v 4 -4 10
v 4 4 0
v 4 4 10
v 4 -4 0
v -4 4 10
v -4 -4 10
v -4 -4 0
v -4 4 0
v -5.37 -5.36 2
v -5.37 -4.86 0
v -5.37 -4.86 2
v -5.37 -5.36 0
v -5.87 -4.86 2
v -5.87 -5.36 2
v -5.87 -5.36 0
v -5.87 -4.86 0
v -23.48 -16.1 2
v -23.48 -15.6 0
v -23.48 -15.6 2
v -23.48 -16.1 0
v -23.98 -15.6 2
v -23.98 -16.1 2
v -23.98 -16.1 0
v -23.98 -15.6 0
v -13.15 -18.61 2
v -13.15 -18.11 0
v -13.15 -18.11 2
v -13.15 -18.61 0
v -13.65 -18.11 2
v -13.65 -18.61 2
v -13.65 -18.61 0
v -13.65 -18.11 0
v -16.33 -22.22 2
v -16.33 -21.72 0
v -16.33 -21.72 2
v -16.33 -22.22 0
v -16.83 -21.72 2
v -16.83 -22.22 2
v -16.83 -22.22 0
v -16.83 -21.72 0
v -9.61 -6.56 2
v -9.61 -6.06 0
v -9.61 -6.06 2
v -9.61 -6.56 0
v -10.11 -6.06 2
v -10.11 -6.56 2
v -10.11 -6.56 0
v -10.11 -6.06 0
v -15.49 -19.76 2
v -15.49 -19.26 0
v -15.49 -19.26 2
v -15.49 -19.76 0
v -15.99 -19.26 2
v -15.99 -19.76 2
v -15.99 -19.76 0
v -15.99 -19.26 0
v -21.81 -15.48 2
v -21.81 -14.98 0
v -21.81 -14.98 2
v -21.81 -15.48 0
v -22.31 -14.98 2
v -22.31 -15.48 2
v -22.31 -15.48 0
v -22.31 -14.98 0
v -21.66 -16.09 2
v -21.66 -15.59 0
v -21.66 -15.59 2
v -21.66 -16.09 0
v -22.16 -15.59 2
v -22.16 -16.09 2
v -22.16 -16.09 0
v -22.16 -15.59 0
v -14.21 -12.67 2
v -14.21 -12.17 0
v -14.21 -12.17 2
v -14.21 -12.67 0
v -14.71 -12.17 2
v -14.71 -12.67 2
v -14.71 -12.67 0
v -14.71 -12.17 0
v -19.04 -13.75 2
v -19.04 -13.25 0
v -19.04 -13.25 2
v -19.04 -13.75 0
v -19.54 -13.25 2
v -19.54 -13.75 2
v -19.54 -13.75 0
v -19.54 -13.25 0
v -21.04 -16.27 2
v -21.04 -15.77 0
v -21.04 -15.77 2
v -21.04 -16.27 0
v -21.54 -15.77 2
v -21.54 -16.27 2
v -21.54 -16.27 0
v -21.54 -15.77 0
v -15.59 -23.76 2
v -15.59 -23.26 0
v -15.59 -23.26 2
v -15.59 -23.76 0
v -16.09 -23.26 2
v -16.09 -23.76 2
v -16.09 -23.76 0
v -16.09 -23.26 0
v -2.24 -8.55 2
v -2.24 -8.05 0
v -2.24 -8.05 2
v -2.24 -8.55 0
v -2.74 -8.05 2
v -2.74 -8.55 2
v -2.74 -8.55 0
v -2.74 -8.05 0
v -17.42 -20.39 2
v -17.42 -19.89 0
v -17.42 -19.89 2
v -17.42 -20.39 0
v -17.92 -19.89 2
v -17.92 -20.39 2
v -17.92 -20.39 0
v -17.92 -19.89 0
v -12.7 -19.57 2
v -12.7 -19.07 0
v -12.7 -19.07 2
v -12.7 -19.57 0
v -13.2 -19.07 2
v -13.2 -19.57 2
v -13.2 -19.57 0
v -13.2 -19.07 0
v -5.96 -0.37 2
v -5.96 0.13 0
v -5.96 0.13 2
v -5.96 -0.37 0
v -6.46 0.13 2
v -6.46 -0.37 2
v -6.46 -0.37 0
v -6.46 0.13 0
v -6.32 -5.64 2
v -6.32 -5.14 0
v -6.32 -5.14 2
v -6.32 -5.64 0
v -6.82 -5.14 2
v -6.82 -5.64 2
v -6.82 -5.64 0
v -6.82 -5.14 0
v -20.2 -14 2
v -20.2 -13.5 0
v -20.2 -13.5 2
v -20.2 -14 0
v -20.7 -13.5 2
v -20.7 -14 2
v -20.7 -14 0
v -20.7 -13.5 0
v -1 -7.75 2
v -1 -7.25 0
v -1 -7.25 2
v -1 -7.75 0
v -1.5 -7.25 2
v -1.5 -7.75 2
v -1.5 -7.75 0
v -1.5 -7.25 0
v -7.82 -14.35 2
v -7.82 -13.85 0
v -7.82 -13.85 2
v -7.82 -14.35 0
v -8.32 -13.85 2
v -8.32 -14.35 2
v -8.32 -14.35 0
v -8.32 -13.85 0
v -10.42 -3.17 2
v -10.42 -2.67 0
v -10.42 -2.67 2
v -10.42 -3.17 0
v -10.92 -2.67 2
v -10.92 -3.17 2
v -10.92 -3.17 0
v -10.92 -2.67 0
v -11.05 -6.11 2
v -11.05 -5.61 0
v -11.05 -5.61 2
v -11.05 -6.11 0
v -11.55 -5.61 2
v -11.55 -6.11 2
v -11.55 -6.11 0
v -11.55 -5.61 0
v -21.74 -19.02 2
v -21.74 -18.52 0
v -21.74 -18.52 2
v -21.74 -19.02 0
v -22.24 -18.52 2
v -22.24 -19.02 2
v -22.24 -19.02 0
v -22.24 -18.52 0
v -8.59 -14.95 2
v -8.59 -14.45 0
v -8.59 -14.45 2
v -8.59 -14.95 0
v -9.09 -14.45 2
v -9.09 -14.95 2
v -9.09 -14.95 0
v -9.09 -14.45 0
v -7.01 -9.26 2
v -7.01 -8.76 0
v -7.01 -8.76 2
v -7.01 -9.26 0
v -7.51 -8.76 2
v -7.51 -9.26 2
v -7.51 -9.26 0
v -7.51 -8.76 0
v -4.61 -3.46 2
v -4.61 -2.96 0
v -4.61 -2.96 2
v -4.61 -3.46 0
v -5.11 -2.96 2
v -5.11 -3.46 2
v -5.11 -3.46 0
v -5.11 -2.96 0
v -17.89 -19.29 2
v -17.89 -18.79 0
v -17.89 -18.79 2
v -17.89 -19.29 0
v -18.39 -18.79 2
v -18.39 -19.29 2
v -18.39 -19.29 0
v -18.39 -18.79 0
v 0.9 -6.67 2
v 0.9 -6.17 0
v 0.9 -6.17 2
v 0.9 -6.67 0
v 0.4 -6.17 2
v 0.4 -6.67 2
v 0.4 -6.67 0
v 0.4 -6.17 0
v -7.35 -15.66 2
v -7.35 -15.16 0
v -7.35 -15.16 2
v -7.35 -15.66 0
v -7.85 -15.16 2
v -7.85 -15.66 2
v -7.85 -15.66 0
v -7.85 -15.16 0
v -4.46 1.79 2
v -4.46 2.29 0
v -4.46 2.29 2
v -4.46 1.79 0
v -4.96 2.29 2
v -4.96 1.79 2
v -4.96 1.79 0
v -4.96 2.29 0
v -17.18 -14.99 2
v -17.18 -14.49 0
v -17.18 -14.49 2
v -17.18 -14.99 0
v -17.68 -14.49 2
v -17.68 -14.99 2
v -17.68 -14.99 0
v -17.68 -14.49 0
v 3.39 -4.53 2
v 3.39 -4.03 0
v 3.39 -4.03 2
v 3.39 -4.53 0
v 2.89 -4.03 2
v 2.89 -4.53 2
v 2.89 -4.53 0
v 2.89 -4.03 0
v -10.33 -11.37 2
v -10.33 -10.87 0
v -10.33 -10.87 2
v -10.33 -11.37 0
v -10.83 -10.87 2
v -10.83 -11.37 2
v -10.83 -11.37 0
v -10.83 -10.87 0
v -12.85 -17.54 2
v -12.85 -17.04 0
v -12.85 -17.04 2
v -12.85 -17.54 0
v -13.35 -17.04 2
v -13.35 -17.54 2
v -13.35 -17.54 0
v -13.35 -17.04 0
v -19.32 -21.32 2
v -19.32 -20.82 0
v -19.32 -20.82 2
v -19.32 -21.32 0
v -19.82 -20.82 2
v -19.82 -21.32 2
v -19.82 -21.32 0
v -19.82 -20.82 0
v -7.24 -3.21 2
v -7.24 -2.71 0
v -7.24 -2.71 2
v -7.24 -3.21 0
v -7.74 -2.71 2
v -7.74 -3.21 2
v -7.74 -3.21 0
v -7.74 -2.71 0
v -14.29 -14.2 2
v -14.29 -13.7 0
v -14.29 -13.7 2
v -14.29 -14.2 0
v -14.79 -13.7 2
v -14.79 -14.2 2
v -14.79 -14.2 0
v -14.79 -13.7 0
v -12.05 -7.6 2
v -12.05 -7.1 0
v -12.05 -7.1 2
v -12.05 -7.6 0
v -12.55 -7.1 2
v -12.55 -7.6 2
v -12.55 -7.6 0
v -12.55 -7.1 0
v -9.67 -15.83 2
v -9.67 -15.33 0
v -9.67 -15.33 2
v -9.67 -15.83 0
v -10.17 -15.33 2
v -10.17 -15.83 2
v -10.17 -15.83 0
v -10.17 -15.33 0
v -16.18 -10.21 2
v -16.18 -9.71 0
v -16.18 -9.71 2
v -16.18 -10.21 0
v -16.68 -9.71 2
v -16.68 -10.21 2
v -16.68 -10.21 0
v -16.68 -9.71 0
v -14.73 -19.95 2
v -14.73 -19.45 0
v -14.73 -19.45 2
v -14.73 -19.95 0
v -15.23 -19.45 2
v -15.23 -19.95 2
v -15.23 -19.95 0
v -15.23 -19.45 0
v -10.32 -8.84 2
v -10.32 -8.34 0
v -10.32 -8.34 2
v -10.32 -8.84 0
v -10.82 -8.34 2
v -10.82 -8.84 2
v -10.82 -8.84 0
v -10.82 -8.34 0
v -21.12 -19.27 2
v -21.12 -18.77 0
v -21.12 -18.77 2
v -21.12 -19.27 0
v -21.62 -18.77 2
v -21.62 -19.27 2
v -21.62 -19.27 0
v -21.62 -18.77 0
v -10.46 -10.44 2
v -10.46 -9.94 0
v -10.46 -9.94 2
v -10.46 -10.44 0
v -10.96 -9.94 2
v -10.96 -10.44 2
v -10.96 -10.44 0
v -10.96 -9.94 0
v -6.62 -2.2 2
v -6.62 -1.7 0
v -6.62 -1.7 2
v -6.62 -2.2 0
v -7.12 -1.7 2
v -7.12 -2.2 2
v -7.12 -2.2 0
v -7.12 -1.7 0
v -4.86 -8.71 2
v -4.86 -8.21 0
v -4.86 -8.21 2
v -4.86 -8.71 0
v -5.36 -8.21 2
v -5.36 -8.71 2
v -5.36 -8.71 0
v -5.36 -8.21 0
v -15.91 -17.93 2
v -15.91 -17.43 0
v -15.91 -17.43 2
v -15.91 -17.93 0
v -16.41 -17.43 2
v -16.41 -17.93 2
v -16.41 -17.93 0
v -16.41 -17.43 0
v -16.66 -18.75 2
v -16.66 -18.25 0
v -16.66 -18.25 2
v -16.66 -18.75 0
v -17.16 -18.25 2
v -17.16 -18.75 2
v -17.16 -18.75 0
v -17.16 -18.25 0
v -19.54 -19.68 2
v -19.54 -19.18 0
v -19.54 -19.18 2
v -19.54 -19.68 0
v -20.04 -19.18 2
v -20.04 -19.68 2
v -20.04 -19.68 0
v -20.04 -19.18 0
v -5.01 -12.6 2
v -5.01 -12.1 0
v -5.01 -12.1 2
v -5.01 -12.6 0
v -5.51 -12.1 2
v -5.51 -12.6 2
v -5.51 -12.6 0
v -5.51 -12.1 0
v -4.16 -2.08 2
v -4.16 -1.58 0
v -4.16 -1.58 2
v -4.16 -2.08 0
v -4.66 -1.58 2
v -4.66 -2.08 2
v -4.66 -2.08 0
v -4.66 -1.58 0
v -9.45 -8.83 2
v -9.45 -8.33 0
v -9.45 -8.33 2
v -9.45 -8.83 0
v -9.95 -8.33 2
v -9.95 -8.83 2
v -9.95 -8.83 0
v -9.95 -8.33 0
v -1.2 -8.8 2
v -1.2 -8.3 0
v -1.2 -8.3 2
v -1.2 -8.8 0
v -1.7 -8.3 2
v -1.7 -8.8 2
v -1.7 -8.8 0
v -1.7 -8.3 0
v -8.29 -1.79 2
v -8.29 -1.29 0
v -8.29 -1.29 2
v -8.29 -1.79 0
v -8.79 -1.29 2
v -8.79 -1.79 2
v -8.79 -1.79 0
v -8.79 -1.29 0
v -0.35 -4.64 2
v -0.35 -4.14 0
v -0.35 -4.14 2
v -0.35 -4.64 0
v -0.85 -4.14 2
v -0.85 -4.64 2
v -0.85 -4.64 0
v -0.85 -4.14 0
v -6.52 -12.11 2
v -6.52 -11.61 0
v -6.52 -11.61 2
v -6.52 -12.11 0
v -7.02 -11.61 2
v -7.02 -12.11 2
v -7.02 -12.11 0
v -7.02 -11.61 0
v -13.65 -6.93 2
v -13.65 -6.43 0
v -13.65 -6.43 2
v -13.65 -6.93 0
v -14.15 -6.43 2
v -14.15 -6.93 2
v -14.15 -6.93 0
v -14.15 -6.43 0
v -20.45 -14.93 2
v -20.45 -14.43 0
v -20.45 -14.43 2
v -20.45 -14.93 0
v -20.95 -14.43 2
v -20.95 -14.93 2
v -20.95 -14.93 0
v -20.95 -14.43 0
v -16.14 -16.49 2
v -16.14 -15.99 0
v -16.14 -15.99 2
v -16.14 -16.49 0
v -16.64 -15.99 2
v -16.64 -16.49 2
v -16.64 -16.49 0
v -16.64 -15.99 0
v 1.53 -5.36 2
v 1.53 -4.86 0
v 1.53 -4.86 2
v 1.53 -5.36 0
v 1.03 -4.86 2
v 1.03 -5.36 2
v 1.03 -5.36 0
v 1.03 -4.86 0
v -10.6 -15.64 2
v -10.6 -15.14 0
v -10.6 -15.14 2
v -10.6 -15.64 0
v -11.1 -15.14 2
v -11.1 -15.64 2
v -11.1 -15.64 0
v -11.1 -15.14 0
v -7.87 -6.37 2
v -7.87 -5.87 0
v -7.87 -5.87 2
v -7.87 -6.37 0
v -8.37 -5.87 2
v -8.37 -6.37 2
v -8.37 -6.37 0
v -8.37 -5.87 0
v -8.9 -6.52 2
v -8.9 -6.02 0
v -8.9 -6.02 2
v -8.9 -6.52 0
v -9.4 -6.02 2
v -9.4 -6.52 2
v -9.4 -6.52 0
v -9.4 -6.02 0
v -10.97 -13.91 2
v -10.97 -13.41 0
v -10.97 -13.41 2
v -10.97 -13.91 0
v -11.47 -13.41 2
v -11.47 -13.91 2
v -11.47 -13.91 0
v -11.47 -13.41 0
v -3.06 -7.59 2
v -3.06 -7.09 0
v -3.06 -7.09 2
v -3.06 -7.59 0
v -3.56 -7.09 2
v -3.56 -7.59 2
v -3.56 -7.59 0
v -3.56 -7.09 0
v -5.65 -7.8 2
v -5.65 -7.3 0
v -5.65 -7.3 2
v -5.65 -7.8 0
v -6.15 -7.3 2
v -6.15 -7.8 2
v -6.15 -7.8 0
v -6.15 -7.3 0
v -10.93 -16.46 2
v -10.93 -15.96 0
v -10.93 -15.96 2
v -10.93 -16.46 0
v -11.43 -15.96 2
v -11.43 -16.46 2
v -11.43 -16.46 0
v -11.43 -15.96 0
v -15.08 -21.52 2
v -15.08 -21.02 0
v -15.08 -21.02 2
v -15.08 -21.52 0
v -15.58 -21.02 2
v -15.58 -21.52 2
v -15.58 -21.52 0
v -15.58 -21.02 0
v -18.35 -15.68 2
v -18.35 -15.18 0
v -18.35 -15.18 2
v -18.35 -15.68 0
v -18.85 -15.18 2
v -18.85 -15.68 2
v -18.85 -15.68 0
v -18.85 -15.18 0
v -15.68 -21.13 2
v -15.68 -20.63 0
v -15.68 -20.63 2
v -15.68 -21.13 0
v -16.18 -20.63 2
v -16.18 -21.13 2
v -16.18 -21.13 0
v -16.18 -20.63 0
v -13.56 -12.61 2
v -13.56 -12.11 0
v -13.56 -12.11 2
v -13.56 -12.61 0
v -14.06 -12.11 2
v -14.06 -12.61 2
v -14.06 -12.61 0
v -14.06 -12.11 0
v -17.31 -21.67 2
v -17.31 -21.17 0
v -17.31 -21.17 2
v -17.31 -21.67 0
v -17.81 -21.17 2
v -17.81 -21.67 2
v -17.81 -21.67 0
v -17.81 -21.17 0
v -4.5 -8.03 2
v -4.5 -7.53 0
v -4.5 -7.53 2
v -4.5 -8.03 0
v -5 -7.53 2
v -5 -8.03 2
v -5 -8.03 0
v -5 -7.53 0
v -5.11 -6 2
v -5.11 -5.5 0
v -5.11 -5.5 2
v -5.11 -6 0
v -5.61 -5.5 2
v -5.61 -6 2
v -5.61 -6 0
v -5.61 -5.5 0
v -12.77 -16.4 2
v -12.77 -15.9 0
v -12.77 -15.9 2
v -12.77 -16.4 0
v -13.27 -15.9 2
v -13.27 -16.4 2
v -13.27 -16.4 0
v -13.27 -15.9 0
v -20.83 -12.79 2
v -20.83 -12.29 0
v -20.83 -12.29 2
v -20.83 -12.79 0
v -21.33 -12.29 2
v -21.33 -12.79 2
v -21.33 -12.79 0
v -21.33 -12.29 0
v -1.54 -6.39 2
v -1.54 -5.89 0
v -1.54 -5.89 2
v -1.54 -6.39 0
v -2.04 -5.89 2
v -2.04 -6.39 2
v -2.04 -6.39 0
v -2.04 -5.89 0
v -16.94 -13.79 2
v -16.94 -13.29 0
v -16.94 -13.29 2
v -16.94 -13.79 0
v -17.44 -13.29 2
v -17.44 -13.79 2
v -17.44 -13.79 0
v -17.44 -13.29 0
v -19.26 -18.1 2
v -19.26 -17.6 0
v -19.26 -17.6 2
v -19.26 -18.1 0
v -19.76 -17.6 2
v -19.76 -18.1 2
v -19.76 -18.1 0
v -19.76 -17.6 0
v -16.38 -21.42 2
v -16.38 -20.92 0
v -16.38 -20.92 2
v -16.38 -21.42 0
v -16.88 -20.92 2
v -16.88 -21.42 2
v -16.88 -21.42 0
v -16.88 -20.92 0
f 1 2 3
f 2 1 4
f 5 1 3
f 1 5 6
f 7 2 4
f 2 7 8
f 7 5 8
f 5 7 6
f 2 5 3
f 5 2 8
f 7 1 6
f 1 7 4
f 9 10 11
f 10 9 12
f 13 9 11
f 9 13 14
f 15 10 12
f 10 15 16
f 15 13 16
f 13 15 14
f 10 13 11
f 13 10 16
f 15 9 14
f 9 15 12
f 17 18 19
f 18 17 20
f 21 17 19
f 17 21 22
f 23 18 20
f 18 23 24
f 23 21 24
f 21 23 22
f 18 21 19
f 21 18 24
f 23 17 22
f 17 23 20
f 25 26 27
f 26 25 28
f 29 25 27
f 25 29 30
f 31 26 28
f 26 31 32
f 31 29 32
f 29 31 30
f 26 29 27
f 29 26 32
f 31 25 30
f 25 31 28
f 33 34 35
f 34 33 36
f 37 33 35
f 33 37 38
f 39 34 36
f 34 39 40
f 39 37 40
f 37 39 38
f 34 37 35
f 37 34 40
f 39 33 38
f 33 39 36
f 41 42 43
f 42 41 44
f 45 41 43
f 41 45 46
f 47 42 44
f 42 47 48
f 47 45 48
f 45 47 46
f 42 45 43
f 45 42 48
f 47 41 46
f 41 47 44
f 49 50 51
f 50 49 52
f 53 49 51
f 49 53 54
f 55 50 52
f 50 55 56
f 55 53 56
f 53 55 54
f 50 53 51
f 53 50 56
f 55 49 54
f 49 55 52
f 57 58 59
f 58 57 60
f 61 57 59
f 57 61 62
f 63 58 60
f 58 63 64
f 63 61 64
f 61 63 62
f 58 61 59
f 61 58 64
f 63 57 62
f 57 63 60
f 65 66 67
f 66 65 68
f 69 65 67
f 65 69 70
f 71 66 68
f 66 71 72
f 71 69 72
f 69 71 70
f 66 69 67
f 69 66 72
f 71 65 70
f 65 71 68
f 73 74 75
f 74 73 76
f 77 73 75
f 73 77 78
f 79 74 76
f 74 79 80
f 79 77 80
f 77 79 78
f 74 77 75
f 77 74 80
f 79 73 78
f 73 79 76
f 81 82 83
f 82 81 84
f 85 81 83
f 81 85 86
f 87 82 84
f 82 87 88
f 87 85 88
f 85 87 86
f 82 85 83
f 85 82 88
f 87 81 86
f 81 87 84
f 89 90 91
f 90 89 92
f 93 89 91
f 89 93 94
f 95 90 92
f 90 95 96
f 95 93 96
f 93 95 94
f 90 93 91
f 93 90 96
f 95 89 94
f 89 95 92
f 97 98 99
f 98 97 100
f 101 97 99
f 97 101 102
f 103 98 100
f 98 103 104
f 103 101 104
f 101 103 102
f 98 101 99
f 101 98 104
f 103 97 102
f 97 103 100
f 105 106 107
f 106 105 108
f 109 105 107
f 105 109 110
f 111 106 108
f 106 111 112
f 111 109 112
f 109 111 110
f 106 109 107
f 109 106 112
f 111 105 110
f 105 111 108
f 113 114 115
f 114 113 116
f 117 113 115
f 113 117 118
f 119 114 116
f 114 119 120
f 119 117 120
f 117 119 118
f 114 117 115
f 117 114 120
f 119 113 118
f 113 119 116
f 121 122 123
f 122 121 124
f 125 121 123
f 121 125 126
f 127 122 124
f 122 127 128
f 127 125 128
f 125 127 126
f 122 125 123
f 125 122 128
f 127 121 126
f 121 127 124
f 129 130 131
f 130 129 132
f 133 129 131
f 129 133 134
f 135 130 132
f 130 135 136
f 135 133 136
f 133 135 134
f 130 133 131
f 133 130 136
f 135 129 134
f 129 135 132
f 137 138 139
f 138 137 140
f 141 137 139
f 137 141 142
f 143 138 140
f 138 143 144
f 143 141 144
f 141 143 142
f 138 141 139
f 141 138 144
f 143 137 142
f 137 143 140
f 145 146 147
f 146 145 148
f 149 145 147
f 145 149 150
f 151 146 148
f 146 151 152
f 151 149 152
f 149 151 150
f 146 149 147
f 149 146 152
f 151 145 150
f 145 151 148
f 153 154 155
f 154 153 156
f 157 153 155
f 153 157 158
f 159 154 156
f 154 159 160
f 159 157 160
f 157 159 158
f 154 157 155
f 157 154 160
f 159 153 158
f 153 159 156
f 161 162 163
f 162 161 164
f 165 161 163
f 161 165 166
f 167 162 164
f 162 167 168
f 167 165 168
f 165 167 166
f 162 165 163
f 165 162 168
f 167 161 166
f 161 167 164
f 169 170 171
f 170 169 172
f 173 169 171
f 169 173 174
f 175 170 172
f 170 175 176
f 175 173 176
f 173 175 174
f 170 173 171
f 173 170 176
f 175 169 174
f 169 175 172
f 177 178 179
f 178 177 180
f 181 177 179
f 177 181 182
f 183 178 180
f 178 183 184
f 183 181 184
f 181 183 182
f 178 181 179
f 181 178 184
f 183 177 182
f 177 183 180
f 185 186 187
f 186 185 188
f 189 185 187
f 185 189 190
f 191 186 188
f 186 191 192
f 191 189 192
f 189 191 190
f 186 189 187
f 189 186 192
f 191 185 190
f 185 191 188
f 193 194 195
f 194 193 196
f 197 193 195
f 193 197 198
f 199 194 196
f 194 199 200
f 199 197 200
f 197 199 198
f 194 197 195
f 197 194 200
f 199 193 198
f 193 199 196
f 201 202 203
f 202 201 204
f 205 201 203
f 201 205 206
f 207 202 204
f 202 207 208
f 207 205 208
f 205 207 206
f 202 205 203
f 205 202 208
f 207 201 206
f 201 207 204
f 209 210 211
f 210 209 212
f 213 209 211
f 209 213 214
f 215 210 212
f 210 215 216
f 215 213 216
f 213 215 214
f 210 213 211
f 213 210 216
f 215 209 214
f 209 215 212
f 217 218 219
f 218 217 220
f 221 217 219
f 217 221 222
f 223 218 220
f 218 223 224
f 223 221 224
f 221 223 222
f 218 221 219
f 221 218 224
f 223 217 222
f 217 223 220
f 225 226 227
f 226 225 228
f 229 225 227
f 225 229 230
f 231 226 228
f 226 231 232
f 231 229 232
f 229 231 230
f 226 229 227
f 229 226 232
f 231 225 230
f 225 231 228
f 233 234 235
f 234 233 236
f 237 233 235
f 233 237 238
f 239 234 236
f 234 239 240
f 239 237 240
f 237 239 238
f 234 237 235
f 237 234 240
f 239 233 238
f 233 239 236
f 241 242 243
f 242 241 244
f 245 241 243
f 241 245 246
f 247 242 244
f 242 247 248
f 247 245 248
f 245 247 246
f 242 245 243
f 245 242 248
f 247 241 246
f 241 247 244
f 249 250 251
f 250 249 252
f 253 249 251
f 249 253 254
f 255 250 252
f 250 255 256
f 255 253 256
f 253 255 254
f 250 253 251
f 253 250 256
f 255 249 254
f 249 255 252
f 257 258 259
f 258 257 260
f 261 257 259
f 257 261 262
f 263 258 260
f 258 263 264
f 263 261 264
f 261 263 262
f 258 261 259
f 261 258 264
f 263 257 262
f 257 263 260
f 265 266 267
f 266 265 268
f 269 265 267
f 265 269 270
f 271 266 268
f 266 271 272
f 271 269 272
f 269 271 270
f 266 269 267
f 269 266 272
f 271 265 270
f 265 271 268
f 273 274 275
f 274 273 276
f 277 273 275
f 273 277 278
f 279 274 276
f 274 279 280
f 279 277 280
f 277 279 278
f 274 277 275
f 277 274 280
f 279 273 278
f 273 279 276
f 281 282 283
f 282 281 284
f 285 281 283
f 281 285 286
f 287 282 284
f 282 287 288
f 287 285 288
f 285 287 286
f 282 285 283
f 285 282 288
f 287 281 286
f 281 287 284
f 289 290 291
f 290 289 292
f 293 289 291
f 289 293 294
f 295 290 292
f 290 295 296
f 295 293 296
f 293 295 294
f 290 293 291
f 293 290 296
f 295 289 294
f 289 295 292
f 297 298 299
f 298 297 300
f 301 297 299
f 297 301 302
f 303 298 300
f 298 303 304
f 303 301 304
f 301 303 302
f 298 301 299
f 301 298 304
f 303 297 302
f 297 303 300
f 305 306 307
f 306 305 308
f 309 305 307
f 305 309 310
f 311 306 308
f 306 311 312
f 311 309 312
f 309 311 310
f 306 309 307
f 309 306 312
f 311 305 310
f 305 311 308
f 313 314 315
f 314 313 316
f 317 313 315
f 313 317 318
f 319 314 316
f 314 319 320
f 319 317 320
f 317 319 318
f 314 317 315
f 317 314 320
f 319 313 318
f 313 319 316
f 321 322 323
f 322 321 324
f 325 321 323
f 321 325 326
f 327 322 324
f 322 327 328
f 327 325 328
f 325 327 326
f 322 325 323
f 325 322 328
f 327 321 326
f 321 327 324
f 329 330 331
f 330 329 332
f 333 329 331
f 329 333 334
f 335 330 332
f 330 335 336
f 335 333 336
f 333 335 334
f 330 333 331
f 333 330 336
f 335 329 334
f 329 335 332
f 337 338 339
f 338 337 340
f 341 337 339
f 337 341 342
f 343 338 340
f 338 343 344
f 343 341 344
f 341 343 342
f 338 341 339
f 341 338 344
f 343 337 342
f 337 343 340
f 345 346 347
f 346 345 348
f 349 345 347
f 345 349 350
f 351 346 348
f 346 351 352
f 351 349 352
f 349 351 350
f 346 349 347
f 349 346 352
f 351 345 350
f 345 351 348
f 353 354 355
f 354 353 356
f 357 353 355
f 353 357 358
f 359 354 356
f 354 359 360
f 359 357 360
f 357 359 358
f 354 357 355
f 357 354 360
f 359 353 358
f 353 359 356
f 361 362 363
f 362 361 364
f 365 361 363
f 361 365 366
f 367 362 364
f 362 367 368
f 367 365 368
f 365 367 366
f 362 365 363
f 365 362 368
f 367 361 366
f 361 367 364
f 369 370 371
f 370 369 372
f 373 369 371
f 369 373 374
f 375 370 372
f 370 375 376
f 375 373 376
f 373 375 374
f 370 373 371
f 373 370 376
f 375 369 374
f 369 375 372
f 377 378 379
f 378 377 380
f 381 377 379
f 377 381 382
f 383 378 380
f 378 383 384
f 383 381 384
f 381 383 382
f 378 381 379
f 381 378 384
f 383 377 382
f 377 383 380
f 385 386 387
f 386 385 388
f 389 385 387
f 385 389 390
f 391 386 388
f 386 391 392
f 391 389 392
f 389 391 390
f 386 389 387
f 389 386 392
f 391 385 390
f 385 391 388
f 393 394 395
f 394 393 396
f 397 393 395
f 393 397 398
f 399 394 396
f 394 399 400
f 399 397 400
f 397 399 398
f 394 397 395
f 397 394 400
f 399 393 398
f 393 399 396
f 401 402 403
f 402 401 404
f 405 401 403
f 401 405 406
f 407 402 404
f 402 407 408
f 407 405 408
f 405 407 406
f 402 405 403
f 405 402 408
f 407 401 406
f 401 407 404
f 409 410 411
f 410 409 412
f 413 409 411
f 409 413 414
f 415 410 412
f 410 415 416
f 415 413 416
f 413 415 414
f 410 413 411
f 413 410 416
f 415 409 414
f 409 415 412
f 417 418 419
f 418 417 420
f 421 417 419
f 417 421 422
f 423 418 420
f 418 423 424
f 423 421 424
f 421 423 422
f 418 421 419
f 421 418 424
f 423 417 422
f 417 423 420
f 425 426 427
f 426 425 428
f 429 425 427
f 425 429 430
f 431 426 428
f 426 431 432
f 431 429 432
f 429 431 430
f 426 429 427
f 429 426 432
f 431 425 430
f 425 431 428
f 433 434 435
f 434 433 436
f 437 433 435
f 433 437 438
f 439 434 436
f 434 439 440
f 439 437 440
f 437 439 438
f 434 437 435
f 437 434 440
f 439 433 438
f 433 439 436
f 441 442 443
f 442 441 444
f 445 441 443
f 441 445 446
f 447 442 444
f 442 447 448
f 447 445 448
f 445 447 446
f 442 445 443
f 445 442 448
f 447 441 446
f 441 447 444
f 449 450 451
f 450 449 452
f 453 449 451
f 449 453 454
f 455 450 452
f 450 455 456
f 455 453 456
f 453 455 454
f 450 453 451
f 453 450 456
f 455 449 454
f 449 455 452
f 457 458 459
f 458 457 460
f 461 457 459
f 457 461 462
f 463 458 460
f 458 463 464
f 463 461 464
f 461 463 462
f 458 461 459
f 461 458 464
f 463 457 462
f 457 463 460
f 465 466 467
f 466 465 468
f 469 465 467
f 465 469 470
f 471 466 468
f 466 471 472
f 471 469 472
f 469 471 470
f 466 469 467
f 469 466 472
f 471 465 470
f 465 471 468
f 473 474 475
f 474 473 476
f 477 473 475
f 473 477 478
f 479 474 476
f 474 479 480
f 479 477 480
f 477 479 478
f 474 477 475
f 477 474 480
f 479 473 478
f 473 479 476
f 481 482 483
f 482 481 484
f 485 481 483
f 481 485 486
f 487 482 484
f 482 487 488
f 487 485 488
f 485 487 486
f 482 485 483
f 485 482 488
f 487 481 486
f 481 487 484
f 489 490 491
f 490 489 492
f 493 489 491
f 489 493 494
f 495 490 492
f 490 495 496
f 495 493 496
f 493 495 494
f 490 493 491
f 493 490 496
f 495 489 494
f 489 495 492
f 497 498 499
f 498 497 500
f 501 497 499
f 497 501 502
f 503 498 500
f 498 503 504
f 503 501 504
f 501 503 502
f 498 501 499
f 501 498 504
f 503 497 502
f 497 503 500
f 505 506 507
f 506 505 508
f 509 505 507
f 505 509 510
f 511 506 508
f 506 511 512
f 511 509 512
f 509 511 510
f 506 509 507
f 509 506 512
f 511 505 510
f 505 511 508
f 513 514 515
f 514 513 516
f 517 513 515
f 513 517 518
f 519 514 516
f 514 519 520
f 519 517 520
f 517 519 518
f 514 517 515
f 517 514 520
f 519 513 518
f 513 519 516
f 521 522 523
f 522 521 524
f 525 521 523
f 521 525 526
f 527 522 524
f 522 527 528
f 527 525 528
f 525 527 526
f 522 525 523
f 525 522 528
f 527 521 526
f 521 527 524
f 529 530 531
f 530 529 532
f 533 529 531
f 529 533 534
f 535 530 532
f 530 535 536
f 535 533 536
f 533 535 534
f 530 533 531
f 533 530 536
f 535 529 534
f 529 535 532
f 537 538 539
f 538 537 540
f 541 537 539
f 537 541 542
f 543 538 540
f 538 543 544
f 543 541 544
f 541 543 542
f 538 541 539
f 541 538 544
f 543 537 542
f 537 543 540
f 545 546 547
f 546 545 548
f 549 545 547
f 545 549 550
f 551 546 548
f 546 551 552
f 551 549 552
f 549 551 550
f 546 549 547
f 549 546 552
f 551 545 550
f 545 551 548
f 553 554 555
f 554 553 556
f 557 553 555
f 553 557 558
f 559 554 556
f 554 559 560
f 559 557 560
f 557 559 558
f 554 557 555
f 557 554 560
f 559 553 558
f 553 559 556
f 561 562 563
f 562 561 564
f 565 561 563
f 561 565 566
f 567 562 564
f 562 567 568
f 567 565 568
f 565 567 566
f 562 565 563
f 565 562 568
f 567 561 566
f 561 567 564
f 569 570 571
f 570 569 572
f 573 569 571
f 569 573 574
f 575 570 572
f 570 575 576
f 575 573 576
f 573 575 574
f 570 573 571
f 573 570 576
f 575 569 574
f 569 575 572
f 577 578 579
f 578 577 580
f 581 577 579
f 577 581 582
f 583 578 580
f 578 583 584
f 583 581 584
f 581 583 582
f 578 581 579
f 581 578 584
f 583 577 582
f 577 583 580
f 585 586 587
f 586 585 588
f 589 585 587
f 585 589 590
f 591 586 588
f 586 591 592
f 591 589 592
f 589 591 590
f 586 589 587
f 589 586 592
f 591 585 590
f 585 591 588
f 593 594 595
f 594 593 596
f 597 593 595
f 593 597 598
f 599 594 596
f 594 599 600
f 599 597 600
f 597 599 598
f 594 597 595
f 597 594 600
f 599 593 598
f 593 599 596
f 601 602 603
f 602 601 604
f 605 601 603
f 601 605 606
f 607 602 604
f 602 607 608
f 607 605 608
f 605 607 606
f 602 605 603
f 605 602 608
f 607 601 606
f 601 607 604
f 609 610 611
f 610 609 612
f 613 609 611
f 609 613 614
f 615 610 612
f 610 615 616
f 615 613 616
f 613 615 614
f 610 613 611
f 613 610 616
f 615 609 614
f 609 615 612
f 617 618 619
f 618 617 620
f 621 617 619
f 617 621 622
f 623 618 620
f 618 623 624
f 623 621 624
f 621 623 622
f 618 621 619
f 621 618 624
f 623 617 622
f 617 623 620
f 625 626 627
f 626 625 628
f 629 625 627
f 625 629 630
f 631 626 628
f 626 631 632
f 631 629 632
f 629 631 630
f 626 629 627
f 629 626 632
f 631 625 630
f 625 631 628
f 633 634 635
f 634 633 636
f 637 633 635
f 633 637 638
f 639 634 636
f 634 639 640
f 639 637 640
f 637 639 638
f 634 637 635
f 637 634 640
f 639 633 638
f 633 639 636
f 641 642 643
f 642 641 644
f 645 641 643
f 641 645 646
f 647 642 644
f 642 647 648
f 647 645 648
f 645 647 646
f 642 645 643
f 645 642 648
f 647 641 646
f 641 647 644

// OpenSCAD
translate([0, 0, 5]) color([0,1,0,0.9]) cube([8, 8, 10], center=true);
translate([-5.62, -5.11, 1]) color([1,0,0]) cube([0.5, 0.5, 2], center=true);
translate([-23.73, -15.85, 1]) color([1,0,0]) cube([0.5, 0.5, 2], center=true);
translate([-13.4, -18.36, 1]) color([1,0,0]) cube([0.5, 0.5, 2], center=true);
translate([-16.58, -21.97, 1]) color([1,0,0]) cube([0.5, 0.5, 2], center=true);
translate([-9.86, -6.31, 1]) color([1,0,0]) cube([0.5, 0.5, 2], center=true);
translate([-15.74, -19.51, 1]) color([1,0,0]) cube([0.5, 0.5, 2], center=true);
translate([-22.06, -15.23, 1]) color([1,0,0]) cube([0.5, 0.5, 2], center=true);
translate([-21.91, -15.84, 1]) color([1,0,0]) cube([0.5, 0.5, 2], center=true);
translate([-14.46, -12.42, 1]) color([1,0,0]) cube([0.5, 0.5, 2], center=true);
translate([-19.29, -13.5, 1]) color([1,0,0]) cube([0.5, 0.5, 2], center=true);
translate([-21.29, -16.02, 1]) color([1,0,0]) cube([0.5, 0.5, 2], center=true);
translate([-15.84, -23.51, 1]) color([1,0,0]) cube([0.5, 0.5, 2], center=true);
translate([-2.49, -8.3, 1]) color([1,0,0]) cube([0.5, 0.5, 2], center=true);
translate([-17.67, -20.14, 1]) color([1,0,0]) cube([0.5, 0.5, 2], center=true);
translate([-12.95, -19.32, 1]) color([1,0,0]) cube([0.5, 0.5, 2], center=true);
translate([-6.21, -0.12, 1]) color([1,0,0]) cube([0.5, 0.5, 2], center=true);
translate([-6.57, -5.39, 1]) color([1,0,0]) cube([0.5, 0.5, 2], center=true);
translate([-20.45, -13.75, 1]) color([1,0,0]) cube([0.5, 0.5, 2], center=true);
translate([-1.25, -7.5, 1]) color([1,0,0]) cube([0.5, 0.5, 2], center=true);
translate([-8.07, -14.1, 1]) color([1,0,0]) cube([0.5, 0.5, 2], center=true);
translate([-10.67, -2.92, 1]) color([1,0,0]) cube([0.5, 0.5, 2], center=true);
translate([-11.3, -5.86, 1]) color([1,0,0]) cube([0.5, 0.5, 2], center=true);
translate([-21.99, -18.77, 1]) color([1,0,0]) cube([0.5, 0.5, 2], center=true);
translate([-8.84, -14.7, 1]) color([1,0,0]) cube([0.5, 0.5, 2], center=true);
translate([-7.26, -9.01, 1]) color([1,0,0]) cube([0.5, 0.5, 2], center=true);
translate([-4.86, -3.21, 1]) color([1,0,0]) cube([0.5, 0.5, 2], center=true);
translate([-18.14, -19.04, 1]) color([1,0,0]) cube([0.5, 0.5, 2], center=true);
translate([0.65, -6.42, 1]) color([1,0,0]) cube([0.5, 0.5, 2], center=true);
translate([-7.6, -15.41, 1]) color([1,0,0]) cube([0.5, 0.5, 2], center=true);
translate([-4.71, 2.04, 1]) color([1,0,0]) cube([0.5, 0.5, 2], center=true);
translate([-17.43, -14.74, 1]) color([1,0,0]) cube([0.5, 0.5, 2], center=true);
translate([3.14, -4.28, 1]) color([1,0,0]) cube([0.5, 0.5, 2], center=true);
translate([-10.58, -11.12, 1]) color([1,0,0]) cube([0.5, 0.5, 2], center=true);
translate([-13.1, -17.29, 1]) color([1,0,0]) cube([0.5, 0.5, 2], center=true);
translate([-19.57, -21.07, 1]) color([1,0,0]) cube([0.5, 0.5, 2], center=true);
translate([-7.49, -2.96, 1]) color([1,0,0]) cube([0.5, 0.5, 2], center=true);
translate([-14.54, -13.95, 1]) color([1,0,0]) cube([0.5, 0.5, 2], center=true);
translate([-12.3, -7.35, 1]) color([1,0,0]) cube([0.5, 0.5, 2], center=true);
translate([-9.92, -15.58, 1]) color([1,0,0]) cube([0.5, 0.5, 2], center=true);
translate([-16.43, -9.96, 1]) color([1,0,0]) cube([0.5, 0.5, 2], center=true);
translate([-14.98, -19.7, 1]) color([1,0,0]) cube([0.5, 0.5, 2], center=true);
translate([-10.57, -8.59, 1]) color([1,0,0]) cube([0.5, 0.5, 2], center=true);
translate([-21.37, -19.02, 1]) color([1,0,0]) cube([0.5, 0.5, 2], center=true);
translate([-10.71, -10.19, 1]) color([1,0,0]) cube([0.5, 0.5, 2], center=true);
translate([-6.87, -1.95, 1]) color([1,0,0]) cube([0.5, 0.5, 2], center=true);
translate([-5.11, -8.46, 1]) color([1,0,0]) cube([0.5, 0.5, 2], center=true);
translate([-16.16, -17.68, 1]) color([1,0,0]) cube([0.5, 0.5, 2], center=true);
translate([-16.91, -18.5, 1]) color([1,0,0]) cube([0.5, 0.5, 2], center=true);
translate([-19.79, -19.43, 1]) color([1,0,0]) cube([0.5, 0.5, 2], center=true);
translate([-5.26, -12.35, 1]) color([1,0,0]) cube([0.5, 0.5, 2], center=true);
translate([-4.41, -1.83, 1]) color([1,0,0]) cube([0.5, 0.5, 2], center=true);
translate([-9.7, -8.58, 1]) color([1,0,0]) cube([0.5, 0.5, 2], center=true);
translate([-1.45, -8.55, 1]) color([1,0,0]) cube([0.5, 0.5, 2], center=true);
translate([-8.54, -1.54, 1]) color([1,0,0]) cube([0.5, 0.5, 2], center=true);
translate([-0.6, -4.39, 1]) color([1,0,0]) cube([0.5, 0.5, 2], center=true);
translate([-6.77, -11.86, 1]) color([1,0,0]) cube([0.5, 0.5, 2], center=true);
translate([-13.9, -6.68, 1]) color([1,0,0]) cube([0.5, 0.5, 2], center=true);
translate([-20.7, -14.68, 1]) color([1,0,0]) cube([0.5, 0.5, 2], center=true);
translate([-16.39, -16.24, 1]) color([1,0,0]) cube([0.5, 0.5, 2], center=true);
translate([1.28, -5.11, 1]) color([1,0,0]) cube([0.5, 0.5, 2], center=true);
translate([-10.85, -15.39, 1]) color([1,0,0]) cube([0.5, 0.5, 2], center=true);
translate([-8.12, -6.12, 1]) color([1,0,0]) cube([0.5, 0.5, 2], center=true);
translate([-9.15, -6.27, 1]) color([1,0,0]) cube([0.5, 0.5, 2], center=true);
translate([-11.22, -13.66, 1]) color([1,0,0]) cube([0.5, 0.5, 2], center=true);
translate([-3.31, -7.34, 1]) color([1,0,0]) cube([0.5, 0.5, 2], center=true);
translate([-5.9, -7.55, 1]) color([1,0,0]) cube([0.5, 0.5, 2], center=true);
translate([-11.18, -16.21, 1]) color([1,0,0]) cube([0.5, 0.5, 2], center=true);
translate([-15.33, -21.27, 1]) color([1,0,0]) cube([0.5, 0.5, 2], center=true);
translate([-18.6, -15.43, 1]) color([1,0,0]) cube([0.5, 0.5, 2], center=true);
translate([-15.93, -20.88, 1]) color([1,0,0]) cube([0.5, 0.5, 2], center=true);
translate([-13.81, -12.36, 1]) color([1,0,0]) cube([0.5, 0.5, 2], center=true);
translate([-17.56, -21.42, 1]) color([1,0,0]) cube([0.5, 0.5, 2], center=true);
translate([-4.75, -7.78, 1]) color([1,0,0]) cube([0.5, 0.5, 2], center=true);
translate([-5.36, -5.75, 1]) color([1,0,0]) cube([0.5, 0.5, 2], center=true);
translate([-13.02, -16.15, 1]) color([1,0,0]) cube([0.5, 0.5, 2], center=true);
translate([-21.08, -12.54, 1]) color([1,0,0]) cube([0.5, 0.5, 2], center=true);
translate([-1.79, -6.14, 1]) color([1,0,0]) cube([0.5, 0.5, 2], center=true);
translate([-17.19, -13.54, 1]) color([1,0,0]) cube([0.5, 0.5, 2], center=true);
translate([-19.51, -17.85, 1]) color([1,0,0]) cube([0.5, 0.5, 2], center=true);
translate([-16.63, -21.17, 1]) color([1,0,0]) cube([0.5, 0.5, 2], center=true);
